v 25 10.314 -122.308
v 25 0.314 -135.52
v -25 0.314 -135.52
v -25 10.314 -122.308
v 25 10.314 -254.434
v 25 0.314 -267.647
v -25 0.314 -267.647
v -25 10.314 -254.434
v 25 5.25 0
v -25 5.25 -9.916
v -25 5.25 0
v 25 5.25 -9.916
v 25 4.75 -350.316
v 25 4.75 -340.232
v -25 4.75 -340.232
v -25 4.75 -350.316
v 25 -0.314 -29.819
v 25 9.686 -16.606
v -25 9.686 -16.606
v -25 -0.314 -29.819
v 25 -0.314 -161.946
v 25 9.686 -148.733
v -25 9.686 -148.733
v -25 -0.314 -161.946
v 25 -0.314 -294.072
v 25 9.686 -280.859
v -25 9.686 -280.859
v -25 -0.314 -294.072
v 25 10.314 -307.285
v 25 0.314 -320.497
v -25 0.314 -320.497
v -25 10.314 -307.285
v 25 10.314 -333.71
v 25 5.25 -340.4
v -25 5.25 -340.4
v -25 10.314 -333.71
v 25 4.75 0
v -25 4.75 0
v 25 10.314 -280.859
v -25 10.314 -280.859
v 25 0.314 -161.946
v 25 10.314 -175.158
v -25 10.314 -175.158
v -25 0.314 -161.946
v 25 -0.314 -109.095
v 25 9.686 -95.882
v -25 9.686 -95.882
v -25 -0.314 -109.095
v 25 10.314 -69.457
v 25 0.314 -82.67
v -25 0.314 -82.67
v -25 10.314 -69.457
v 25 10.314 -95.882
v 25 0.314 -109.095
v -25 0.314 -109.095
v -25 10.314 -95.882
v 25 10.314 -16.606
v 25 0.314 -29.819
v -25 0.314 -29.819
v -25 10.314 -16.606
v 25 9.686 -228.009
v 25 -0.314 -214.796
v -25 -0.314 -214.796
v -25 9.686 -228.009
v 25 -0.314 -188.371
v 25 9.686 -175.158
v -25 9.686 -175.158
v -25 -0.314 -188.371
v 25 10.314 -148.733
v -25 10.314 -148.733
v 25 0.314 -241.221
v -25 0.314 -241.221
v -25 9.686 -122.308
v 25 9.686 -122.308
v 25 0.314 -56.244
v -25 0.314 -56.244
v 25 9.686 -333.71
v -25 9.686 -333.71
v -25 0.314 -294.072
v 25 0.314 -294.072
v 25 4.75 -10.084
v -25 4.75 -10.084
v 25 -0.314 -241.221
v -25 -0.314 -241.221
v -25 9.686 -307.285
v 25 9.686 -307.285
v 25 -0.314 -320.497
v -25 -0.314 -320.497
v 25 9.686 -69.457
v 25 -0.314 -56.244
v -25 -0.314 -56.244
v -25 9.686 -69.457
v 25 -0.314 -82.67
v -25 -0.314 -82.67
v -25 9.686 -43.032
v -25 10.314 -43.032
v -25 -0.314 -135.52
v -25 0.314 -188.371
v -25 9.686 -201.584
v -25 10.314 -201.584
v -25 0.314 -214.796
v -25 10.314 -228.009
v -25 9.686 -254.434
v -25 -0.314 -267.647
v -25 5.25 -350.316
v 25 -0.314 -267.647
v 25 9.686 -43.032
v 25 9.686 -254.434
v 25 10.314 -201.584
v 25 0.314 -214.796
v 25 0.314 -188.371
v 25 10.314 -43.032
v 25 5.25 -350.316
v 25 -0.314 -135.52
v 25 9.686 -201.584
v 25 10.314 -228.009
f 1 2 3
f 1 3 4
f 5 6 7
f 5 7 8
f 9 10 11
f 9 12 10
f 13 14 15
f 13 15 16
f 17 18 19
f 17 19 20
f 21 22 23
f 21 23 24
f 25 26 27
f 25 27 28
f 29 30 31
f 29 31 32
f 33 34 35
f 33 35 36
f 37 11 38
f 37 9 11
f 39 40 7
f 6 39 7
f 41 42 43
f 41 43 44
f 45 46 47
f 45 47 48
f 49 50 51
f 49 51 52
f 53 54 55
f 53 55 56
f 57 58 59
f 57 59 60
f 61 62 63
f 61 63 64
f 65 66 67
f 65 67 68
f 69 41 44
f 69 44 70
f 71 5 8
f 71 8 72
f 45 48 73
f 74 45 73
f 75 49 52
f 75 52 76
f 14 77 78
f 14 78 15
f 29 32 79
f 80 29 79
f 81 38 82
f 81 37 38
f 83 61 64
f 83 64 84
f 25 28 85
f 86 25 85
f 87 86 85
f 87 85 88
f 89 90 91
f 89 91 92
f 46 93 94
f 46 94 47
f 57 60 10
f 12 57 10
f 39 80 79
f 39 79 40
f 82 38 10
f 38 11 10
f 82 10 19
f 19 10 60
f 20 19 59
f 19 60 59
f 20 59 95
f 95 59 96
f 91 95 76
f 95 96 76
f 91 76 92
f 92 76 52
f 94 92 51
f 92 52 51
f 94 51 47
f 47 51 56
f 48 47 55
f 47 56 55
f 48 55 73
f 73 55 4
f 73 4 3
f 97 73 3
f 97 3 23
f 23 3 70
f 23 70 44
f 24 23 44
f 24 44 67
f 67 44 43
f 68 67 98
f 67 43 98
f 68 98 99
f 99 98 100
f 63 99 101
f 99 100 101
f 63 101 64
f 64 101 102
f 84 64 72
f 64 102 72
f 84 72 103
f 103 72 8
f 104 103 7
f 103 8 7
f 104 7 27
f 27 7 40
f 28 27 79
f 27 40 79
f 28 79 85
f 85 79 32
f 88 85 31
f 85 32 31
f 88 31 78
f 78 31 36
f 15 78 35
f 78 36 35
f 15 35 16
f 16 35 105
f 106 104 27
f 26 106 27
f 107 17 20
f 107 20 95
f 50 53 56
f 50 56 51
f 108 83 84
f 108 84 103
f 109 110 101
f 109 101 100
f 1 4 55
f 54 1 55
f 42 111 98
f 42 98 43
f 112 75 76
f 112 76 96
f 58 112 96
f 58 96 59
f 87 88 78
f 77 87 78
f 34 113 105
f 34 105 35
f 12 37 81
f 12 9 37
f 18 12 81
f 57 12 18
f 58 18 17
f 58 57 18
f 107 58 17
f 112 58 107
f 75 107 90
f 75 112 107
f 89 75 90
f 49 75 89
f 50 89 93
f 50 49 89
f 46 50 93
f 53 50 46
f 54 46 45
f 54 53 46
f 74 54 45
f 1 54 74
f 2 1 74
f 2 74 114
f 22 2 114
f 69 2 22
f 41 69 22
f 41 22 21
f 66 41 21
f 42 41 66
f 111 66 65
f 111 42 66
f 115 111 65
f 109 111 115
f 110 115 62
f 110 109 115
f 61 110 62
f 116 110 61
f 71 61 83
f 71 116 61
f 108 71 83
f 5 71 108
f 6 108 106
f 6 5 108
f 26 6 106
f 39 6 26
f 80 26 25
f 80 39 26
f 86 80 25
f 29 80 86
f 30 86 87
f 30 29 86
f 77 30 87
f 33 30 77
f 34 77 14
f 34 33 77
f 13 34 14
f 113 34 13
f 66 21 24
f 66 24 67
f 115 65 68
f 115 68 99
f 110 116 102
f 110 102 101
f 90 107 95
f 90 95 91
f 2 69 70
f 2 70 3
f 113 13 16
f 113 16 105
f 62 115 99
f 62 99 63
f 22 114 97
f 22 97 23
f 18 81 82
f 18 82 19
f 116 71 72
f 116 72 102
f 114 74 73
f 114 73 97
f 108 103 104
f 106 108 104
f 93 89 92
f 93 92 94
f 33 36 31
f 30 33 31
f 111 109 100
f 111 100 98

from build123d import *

# Parameters (mm, degrees)
EXTRUDE_THIN1_DEPTH = 25


with BuildPart() as part:
    # Sketch3 → Extrude-Thin1 (new body, symmetric)
    with BuildSketch(Plane(origin=(0, 0, 0), x_dir=(0, 0, -1), z_dir=(1, 0, 0))):
        Polygon((0, 4.75), (10.083940671, 4.75), (16.606328425, 9.686469499), (29.818985275, -0.313530501), (43.031642125, 9.686469499), (56.244298974, -0.313530501), (69.456955824, 9.686469499), (82.669612674, -0.313530501), (95.882269524, 9.686469499), (109.094926374, -0.313530501), (122.307583223, 9.686469499), (135.520240073, -0.313530501), (148.732896923, 9.686469499), (161.945553773, -0.313530501), (175.158210623, 9.686469499), (188.370867472, -0.313530501), (201.583524322, 9.686469499), (214.796181172, -0.313530501), (228.008838022, 9.686469499), (241.221494872, -0.313530501), (254.434151721, 9.686469499), (267.646808571, -0.313530501), (280.859465421, 9.686469499), (294.072122271, -0.313530501), (307.284779121, 9.686469499), (320.49743597, -0.313530501), (333.71009282, 9.686469499), (340.232480575, 4.75), (350.316421245, 4.75), (350.316421245, 5.25), (340.400361916, 5.25), (333.71009282, 10.313530501), (320.49743597, 0.313530501), (307.284779121, 10.313530501), (294.072122271, 0.313530501), (280.859465421, 10.313530501), (267.646808571, 0.313530501), (254.434151721, 10.313530501), (241.221494872, 0.313530501), (228.008838022, 10.313530501), (214.796181172, 0.313530501), (201.583524322, 10.313530501), (188.370867472, 0.313530501), (175.158210623, 10.313530501), (161.945553773, 0.313530501), (148.732896923, 10.313530501), (135.520240073, 0.313530501), (122.307583223, 10.313530501), (109.094926374, 0.313530501), (95.882269524, 10.313530501), (82.669612674, 0.313530501), (69.456955824, 10.313530501), (56.244298974, 0.313530501), (43.031642125, 10.313530501), (29.818985275, 0.313530501), (16.606328425, 10.313530501), (9.916059329, 5.25), (0, 5.25), align=None)
    extrude(amount=EXTRUDE_THIN1_DEPTH, both=True)


solid = part.part
